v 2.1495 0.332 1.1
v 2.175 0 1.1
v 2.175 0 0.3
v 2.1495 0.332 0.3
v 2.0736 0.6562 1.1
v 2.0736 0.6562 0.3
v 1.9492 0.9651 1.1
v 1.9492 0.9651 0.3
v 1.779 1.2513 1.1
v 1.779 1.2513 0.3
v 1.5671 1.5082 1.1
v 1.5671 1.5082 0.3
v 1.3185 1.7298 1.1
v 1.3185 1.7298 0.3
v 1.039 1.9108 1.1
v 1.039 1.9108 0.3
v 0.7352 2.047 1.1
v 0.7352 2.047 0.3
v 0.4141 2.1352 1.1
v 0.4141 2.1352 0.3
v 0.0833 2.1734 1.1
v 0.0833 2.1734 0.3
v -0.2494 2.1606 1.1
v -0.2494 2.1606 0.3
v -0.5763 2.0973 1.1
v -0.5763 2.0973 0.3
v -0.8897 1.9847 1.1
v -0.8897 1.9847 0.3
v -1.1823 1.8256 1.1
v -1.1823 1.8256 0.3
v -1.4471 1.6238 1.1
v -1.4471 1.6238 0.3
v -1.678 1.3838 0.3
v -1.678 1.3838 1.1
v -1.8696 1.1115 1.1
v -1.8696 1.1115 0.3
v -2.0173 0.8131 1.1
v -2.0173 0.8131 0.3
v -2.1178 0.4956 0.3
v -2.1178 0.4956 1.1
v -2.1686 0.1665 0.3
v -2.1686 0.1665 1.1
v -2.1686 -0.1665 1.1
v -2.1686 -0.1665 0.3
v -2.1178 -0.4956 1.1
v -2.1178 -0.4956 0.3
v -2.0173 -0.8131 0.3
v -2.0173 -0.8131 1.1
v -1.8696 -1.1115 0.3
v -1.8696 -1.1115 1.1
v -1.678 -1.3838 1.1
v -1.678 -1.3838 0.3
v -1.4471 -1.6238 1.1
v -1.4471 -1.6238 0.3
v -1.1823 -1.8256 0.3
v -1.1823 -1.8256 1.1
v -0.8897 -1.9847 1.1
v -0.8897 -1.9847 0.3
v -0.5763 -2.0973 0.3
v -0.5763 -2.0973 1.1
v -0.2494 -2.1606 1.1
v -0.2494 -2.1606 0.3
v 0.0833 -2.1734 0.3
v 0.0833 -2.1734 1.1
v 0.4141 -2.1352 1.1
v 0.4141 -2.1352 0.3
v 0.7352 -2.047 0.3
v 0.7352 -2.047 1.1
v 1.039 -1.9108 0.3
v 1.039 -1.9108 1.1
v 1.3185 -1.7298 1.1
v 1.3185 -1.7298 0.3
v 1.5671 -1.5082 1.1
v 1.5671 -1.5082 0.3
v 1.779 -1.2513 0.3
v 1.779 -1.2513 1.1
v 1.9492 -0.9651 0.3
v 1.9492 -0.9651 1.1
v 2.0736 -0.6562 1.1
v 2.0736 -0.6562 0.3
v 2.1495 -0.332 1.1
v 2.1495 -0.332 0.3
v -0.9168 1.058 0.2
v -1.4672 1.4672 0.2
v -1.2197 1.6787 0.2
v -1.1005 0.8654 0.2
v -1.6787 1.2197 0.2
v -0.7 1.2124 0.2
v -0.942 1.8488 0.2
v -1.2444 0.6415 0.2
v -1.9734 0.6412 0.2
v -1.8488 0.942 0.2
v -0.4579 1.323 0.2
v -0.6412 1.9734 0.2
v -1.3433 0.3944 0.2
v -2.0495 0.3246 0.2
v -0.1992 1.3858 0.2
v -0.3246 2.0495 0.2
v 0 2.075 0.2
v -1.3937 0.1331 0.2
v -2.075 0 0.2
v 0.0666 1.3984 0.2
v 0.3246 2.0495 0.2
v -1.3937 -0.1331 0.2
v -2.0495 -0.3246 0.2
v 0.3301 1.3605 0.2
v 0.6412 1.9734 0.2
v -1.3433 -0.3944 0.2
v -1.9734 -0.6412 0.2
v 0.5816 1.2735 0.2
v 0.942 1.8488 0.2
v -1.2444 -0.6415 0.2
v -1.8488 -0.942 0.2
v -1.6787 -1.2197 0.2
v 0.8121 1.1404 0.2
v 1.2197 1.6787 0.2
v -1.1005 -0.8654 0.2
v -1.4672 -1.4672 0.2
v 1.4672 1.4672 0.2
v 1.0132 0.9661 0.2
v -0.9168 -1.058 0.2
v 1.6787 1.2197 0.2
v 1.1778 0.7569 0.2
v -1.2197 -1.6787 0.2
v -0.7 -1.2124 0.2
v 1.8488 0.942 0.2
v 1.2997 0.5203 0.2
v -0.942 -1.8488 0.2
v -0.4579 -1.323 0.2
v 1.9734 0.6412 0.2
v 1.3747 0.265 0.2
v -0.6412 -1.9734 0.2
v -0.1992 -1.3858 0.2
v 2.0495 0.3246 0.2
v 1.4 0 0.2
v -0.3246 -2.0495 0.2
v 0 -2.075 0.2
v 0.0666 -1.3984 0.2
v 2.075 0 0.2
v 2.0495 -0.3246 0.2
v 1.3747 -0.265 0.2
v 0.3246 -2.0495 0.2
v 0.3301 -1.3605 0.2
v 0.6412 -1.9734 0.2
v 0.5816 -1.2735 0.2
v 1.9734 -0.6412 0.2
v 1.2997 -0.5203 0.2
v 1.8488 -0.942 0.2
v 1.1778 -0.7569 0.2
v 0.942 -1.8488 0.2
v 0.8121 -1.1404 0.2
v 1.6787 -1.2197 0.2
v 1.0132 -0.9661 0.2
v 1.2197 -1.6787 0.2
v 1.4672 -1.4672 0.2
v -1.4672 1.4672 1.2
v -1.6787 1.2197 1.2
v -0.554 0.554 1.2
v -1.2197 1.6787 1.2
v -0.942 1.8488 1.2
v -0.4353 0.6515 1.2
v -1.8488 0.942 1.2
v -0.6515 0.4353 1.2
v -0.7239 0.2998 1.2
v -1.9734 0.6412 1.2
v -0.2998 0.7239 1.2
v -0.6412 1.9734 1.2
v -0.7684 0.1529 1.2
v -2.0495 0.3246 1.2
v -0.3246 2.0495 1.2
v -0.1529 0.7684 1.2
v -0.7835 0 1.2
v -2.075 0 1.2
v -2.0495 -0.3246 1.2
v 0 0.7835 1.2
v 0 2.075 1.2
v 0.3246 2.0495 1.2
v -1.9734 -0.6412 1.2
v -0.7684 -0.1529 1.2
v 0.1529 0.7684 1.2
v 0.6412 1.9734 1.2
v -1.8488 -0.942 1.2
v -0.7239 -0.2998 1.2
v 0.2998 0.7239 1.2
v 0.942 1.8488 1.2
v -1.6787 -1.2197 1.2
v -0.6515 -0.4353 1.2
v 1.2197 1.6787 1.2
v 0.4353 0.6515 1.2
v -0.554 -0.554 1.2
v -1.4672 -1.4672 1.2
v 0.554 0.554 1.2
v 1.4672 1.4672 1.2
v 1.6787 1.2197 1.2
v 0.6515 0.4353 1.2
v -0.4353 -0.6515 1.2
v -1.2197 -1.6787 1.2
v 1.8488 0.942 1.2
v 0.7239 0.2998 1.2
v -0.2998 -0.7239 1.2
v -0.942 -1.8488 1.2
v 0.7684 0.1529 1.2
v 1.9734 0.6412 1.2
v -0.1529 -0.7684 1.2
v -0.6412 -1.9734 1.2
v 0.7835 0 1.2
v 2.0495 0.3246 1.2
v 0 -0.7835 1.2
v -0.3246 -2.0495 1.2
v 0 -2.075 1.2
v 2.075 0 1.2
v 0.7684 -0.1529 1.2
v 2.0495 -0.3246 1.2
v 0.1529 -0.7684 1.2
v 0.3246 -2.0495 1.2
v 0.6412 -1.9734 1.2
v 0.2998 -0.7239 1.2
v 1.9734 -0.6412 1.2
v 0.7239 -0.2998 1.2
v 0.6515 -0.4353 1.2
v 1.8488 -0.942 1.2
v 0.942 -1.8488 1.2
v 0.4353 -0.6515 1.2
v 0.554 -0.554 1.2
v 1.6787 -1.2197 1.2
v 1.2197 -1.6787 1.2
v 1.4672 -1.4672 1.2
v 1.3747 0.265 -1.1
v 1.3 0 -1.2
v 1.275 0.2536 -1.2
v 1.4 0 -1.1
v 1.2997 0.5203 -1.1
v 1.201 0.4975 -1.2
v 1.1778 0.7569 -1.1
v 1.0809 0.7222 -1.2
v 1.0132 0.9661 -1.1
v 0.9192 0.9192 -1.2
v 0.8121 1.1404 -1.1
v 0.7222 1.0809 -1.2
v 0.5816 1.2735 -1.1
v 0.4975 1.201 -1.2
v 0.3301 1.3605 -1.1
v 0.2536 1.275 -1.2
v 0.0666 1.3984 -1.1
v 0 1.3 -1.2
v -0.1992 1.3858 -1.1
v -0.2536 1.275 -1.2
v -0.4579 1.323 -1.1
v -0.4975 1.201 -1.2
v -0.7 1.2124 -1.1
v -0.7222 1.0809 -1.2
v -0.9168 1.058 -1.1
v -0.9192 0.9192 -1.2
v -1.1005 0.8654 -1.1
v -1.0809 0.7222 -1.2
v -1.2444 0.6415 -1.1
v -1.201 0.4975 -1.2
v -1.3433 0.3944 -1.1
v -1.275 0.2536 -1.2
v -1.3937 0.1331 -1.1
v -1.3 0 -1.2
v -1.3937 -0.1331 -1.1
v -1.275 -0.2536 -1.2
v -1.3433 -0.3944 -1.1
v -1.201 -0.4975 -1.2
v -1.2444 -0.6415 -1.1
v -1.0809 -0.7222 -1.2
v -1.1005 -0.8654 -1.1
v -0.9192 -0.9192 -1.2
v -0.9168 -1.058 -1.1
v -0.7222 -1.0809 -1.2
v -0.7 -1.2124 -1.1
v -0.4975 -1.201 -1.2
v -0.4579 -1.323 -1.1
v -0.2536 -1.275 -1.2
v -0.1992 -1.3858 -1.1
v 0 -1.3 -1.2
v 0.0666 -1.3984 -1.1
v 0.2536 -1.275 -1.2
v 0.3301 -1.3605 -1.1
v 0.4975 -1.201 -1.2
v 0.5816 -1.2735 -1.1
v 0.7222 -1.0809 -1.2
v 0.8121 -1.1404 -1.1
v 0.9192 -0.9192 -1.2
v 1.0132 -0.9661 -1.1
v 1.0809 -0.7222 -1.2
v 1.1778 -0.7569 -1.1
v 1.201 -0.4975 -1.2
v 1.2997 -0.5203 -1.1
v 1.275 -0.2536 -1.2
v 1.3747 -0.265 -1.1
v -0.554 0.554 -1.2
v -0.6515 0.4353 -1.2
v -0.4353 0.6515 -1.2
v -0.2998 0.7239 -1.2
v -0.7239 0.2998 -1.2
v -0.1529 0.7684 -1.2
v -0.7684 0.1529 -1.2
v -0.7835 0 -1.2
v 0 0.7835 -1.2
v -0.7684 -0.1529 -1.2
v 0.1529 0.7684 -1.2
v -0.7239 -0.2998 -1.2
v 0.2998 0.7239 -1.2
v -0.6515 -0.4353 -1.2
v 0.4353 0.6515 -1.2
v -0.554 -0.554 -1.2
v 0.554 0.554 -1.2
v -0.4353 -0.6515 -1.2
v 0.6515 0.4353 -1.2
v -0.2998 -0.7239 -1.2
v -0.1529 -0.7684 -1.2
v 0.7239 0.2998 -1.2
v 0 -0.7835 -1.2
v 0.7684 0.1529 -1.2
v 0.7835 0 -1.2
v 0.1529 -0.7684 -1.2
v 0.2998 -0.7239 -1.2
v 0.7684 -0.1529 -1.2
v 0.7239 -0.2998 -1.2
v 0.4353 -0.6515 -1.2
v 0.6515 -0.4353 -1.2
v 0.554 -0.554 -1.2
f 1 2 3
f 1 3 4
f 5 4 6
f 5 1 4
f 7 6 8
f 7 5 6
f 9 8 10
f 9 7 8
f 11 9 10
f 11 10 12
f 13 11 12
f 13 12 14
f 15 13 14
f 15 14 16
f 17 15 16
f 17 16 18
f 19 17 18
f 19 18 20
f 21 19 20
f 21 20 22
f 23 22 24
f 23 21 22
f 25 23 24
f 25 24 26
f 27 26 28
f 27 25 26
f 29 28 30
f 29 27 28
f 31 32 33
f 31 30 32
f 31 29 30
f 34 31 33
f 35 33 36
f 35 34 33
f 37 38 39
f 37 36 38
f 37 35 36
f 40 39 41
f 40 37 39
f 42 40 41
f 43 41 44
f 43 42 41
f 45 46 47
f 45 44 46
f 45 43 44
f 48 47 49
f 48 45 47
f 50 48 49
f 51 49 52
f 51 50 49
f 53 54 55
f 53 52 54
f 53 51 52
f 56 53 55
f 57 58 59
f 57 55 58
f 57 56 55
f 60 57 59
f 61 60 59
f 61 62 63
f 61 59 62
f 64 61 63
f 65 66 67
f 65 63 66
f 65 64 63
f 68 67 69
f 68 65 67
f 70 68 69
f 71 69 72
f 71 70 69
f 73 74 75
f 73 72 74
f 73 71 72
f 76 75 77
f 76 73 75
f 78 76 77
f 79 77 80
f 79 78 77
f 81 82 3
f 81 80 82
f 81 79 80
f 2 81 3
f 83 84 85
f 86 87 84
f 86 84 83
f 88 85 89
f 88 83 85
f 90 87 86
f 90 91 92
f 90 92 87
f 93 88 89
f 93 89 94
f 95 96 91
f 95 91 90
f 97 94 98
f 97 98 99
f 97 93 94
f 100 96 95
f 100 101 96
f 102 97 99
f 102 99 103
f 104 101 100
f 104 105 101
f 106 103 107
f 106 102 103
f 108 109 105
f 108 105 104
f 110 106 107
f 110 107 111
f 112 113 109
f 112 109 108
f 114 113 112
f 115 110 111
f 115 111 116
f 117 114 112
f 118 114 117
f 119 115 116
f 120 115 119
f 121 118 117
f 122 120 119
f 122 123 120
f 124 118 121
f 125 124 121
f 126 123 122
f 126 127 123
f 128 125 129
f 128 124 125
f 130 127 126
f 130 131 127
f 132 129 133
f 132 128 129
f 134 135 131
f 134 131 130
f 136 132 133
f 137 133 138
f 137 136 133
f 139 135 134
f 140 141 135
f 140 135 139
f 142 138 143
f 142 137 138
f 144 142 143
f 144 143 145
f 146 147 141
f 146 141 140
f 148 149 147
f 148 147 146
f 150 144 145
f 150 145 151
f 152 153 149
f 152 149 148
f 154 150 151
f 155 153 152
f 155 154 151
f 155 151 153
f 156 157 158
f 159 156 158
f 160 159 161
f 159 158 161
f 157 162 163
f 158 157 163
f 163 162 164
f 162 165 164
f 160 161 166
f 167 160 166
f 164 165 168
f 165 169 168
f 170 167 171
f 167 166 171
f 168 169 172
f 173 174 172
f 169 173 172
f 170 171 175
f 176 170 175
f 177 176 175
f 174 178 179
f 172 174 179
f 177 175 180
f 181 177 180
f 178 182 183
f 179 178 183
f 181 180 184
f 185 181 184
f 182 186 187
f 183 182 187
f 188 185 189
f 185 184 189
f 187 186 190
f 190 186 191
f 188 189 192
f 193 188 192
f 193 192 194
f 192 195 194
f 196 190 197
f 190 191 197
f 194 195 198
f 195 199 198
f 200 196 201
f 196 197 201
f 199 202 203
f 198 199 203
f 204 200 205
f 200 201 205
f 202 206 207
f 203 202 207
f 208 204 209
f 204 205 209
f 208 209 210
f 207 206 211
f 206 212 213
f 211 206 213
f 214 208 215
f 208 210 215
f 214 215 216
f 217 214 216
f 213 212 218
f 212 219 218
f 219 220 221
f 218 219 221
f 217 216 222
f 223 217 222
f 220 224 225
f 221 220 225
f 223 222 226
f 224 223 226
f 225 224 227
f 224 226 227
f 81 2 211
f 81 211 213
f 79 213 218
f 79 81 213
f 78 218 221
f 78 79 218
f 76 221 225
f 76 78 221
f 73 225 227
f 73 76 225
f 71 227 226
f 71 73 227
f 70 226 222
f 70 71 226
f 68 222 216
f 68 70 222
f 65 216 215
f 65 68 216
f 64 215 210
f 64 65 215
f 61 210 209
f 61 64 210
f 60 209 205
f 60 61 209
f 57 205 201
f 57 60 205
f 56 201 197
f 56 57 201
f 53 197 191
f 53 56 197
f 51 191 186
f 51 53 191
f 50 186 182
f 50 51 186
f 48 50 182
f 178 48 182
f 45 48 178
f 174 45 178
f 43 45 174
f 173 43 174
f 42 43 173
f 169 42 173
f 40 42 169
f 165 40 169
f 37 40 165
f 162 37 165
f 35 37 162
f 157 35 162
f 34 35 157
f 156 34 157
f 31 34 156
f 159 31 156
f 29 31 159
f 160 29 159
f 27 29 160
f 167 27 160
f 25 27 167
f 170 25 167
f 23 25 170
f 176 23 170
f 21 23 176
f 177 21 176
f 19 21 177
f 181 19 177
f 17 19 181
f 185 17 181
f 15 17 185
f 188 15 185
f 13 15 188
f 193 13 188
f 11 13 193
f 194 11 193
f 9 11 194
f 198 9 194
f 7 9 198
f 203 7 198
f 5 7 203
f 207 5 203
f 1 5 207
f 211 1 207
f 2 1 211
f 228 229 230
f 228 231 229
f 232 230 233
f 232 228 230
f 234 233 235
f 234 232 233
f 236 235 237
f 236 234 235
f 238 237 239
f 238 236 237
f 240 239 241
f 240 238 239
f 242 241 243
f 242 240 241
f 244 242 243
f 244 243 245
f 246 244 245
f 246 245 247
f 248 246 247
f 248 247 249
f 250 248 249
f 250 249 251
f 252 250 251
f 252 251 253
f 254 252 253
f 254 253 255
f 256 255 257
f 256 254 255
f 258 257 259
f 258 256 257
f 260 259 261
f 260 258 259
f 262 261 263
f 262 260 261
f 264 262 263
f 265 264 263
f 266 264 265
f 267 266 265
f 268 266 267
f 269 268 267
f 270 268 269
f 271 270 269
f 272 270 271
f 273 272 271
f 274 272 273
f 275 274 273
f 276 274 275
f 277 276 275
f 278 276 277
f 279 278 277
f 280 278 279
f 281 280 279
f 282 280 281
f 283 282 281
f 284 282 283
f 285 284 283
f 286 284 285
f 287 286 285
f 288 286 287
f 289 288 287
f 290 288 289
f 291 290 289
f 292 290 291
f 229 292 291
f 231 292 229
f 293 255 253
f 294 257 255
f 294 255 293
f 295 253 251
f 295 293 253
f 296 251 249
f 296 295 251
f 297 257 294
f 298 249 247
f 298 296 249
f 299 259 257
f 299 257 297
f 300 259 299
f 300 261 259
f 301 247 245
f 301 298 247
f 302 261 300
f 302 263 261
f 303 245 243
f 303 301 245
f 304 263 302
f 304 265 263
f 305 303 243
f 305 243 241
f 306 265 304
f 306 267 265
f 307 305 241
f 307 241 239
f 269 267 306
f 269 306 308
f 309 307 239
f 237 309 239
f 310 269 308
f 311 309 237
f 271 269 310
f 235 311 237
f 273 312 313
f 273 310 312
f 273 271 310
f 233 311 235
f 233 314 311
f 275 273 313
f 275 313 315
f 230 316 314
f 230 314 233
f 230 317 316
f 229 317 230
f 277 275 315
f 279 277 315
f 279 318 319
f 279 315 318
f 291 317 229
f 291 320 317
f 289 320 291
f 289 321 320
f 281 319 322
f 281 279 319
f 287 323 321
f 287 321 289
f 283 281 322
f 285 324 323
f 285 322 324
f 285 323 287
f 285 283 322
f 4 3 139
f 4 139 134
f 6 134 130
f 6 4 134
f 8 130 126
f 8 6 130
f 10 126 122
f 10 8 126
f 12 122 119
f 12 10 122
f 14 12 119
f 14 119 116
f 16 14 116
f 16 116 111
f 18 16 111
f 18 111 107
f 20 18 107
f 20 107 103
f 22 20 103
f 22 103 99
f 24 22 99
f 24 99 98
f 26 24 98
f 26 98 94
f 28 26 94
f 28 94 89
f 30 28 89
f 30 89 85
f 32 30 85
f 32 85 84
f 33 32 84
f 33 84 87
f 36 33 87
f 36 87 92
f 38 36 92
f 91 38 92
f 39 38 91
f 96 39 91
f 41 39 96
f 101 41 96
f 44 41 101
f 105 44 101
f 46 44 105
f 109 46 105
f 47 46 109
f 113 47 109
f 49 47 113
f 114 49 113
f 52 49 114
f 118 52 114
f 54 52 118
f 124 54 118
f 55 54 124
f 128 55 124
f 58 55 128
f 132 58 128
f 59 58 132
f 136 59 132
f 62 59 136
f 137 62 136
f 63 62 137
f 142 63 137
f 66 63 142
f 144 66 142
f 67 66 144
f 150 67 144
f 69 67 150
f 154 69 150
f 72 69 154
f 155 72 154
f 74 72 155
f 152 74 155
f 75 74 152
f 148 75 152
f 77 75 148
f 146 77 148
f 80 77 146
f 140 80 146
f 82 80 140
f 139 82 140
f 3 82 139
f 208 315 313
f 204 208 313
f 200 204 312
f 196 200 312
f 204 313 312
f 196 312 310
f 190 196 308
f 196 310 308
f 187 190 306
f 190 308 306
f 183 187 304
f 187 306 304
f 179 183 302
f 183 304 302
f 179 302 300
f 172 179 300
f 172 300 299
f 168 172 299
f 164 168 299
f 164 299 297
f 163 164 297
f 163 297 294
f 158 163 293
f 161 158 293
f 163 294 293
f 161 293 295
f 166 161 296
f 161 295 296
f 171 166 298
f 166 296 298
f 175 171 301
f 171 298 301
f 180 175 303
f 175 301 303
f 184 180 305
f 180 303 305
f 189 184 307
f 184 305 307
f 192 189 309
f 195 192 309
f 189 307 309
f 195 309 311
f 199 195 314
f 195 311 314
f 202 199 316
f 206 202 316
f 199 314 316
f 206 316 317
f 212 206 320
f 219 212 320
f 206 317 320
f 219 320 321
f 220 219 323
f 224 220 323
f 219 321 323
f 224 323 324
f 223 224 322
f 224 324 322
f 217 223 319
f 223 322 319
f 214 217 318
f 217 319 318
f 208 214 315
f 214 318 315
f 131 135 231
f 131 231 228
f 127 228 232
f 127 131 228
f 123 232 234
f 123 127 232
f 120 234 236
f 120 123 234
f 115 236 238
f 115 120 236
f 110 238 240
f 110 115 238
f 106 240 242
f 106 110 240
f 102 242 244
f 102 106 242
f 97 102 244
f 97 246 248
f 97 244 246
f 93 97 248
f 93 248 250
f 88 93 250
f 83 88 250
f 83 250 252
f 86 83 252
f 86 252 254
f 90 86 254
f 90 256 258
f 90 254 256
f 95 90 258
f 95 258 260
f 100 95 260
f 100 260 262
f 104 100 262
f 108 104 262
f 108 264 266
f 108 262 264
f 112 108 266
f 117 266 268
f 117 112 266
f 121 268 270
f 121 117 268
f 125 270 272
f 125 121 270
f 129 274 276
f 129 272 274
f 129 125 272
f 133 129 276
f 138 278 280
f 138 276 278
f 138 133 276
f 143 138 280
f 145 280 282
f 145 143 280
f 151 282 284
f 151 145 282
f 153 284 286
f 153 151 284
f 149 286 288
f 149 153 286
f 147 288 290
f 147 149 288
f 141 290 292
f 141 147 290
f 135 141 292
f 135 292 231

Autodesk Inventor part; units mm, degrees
ref_plane "YZ Plane" through (0, 0, 0) normal (1, 0, 0) x (0, 1, 0)
ref_plane "XZ Plane" through (0, 0, 0) normal (0, 1, 0) x (-1, 0, 0)
ref_plane "XY Plane" through (0, 0, 0) normal (0, 0, 1) x (1, 0, 0)
sketch "Sketch1" plane through (0, 0, 0) normal (0, 1, 0) x (-1, 0, 0)
  line L0 (0, 1.2) -> (0, -1.2)
  line L1 (0, -1.2) -> (-1.4, -1.2)
  line L2 (-1.4, -1.2) -> (-1.4, 0.2)
  line L3 (-1.4, 0.2) -> (-2.175, 0.2)
  line L4 (-2.175, 0.2) -> (-2.175, 1.2)
  line L5 (-2.175, 1.2) -> (0, 1.2)
  point P0 (0, 0)
  point P1 (0, 0)
  dimension "d1" = 1
  dimension "d2" = 1.4
  dimension "d3" = 2.8
  dimension "d4" = 4.35
revolve "Revolution1" add sketch "Sketch1" angle 360 about axis through (0, 0, 1.2) along (0, 0, -1)
hole "Hole1" at (0, 0, 1.2) direction (0, 0, -1) diameter 1.567 end through all thread size "M2x0.4" class "6H" standard "ANSI Metric M Profile"
chamfer "Chamfer1" distance 0.1 angle 45 3 edges at (-2.175, 0, 1.2) (-2.175, 0, 0.2) (-1.4, 0, -1.2)
properties part number "Nut_SMD_M2x0.4_1mm" material "Steel, Mild"
